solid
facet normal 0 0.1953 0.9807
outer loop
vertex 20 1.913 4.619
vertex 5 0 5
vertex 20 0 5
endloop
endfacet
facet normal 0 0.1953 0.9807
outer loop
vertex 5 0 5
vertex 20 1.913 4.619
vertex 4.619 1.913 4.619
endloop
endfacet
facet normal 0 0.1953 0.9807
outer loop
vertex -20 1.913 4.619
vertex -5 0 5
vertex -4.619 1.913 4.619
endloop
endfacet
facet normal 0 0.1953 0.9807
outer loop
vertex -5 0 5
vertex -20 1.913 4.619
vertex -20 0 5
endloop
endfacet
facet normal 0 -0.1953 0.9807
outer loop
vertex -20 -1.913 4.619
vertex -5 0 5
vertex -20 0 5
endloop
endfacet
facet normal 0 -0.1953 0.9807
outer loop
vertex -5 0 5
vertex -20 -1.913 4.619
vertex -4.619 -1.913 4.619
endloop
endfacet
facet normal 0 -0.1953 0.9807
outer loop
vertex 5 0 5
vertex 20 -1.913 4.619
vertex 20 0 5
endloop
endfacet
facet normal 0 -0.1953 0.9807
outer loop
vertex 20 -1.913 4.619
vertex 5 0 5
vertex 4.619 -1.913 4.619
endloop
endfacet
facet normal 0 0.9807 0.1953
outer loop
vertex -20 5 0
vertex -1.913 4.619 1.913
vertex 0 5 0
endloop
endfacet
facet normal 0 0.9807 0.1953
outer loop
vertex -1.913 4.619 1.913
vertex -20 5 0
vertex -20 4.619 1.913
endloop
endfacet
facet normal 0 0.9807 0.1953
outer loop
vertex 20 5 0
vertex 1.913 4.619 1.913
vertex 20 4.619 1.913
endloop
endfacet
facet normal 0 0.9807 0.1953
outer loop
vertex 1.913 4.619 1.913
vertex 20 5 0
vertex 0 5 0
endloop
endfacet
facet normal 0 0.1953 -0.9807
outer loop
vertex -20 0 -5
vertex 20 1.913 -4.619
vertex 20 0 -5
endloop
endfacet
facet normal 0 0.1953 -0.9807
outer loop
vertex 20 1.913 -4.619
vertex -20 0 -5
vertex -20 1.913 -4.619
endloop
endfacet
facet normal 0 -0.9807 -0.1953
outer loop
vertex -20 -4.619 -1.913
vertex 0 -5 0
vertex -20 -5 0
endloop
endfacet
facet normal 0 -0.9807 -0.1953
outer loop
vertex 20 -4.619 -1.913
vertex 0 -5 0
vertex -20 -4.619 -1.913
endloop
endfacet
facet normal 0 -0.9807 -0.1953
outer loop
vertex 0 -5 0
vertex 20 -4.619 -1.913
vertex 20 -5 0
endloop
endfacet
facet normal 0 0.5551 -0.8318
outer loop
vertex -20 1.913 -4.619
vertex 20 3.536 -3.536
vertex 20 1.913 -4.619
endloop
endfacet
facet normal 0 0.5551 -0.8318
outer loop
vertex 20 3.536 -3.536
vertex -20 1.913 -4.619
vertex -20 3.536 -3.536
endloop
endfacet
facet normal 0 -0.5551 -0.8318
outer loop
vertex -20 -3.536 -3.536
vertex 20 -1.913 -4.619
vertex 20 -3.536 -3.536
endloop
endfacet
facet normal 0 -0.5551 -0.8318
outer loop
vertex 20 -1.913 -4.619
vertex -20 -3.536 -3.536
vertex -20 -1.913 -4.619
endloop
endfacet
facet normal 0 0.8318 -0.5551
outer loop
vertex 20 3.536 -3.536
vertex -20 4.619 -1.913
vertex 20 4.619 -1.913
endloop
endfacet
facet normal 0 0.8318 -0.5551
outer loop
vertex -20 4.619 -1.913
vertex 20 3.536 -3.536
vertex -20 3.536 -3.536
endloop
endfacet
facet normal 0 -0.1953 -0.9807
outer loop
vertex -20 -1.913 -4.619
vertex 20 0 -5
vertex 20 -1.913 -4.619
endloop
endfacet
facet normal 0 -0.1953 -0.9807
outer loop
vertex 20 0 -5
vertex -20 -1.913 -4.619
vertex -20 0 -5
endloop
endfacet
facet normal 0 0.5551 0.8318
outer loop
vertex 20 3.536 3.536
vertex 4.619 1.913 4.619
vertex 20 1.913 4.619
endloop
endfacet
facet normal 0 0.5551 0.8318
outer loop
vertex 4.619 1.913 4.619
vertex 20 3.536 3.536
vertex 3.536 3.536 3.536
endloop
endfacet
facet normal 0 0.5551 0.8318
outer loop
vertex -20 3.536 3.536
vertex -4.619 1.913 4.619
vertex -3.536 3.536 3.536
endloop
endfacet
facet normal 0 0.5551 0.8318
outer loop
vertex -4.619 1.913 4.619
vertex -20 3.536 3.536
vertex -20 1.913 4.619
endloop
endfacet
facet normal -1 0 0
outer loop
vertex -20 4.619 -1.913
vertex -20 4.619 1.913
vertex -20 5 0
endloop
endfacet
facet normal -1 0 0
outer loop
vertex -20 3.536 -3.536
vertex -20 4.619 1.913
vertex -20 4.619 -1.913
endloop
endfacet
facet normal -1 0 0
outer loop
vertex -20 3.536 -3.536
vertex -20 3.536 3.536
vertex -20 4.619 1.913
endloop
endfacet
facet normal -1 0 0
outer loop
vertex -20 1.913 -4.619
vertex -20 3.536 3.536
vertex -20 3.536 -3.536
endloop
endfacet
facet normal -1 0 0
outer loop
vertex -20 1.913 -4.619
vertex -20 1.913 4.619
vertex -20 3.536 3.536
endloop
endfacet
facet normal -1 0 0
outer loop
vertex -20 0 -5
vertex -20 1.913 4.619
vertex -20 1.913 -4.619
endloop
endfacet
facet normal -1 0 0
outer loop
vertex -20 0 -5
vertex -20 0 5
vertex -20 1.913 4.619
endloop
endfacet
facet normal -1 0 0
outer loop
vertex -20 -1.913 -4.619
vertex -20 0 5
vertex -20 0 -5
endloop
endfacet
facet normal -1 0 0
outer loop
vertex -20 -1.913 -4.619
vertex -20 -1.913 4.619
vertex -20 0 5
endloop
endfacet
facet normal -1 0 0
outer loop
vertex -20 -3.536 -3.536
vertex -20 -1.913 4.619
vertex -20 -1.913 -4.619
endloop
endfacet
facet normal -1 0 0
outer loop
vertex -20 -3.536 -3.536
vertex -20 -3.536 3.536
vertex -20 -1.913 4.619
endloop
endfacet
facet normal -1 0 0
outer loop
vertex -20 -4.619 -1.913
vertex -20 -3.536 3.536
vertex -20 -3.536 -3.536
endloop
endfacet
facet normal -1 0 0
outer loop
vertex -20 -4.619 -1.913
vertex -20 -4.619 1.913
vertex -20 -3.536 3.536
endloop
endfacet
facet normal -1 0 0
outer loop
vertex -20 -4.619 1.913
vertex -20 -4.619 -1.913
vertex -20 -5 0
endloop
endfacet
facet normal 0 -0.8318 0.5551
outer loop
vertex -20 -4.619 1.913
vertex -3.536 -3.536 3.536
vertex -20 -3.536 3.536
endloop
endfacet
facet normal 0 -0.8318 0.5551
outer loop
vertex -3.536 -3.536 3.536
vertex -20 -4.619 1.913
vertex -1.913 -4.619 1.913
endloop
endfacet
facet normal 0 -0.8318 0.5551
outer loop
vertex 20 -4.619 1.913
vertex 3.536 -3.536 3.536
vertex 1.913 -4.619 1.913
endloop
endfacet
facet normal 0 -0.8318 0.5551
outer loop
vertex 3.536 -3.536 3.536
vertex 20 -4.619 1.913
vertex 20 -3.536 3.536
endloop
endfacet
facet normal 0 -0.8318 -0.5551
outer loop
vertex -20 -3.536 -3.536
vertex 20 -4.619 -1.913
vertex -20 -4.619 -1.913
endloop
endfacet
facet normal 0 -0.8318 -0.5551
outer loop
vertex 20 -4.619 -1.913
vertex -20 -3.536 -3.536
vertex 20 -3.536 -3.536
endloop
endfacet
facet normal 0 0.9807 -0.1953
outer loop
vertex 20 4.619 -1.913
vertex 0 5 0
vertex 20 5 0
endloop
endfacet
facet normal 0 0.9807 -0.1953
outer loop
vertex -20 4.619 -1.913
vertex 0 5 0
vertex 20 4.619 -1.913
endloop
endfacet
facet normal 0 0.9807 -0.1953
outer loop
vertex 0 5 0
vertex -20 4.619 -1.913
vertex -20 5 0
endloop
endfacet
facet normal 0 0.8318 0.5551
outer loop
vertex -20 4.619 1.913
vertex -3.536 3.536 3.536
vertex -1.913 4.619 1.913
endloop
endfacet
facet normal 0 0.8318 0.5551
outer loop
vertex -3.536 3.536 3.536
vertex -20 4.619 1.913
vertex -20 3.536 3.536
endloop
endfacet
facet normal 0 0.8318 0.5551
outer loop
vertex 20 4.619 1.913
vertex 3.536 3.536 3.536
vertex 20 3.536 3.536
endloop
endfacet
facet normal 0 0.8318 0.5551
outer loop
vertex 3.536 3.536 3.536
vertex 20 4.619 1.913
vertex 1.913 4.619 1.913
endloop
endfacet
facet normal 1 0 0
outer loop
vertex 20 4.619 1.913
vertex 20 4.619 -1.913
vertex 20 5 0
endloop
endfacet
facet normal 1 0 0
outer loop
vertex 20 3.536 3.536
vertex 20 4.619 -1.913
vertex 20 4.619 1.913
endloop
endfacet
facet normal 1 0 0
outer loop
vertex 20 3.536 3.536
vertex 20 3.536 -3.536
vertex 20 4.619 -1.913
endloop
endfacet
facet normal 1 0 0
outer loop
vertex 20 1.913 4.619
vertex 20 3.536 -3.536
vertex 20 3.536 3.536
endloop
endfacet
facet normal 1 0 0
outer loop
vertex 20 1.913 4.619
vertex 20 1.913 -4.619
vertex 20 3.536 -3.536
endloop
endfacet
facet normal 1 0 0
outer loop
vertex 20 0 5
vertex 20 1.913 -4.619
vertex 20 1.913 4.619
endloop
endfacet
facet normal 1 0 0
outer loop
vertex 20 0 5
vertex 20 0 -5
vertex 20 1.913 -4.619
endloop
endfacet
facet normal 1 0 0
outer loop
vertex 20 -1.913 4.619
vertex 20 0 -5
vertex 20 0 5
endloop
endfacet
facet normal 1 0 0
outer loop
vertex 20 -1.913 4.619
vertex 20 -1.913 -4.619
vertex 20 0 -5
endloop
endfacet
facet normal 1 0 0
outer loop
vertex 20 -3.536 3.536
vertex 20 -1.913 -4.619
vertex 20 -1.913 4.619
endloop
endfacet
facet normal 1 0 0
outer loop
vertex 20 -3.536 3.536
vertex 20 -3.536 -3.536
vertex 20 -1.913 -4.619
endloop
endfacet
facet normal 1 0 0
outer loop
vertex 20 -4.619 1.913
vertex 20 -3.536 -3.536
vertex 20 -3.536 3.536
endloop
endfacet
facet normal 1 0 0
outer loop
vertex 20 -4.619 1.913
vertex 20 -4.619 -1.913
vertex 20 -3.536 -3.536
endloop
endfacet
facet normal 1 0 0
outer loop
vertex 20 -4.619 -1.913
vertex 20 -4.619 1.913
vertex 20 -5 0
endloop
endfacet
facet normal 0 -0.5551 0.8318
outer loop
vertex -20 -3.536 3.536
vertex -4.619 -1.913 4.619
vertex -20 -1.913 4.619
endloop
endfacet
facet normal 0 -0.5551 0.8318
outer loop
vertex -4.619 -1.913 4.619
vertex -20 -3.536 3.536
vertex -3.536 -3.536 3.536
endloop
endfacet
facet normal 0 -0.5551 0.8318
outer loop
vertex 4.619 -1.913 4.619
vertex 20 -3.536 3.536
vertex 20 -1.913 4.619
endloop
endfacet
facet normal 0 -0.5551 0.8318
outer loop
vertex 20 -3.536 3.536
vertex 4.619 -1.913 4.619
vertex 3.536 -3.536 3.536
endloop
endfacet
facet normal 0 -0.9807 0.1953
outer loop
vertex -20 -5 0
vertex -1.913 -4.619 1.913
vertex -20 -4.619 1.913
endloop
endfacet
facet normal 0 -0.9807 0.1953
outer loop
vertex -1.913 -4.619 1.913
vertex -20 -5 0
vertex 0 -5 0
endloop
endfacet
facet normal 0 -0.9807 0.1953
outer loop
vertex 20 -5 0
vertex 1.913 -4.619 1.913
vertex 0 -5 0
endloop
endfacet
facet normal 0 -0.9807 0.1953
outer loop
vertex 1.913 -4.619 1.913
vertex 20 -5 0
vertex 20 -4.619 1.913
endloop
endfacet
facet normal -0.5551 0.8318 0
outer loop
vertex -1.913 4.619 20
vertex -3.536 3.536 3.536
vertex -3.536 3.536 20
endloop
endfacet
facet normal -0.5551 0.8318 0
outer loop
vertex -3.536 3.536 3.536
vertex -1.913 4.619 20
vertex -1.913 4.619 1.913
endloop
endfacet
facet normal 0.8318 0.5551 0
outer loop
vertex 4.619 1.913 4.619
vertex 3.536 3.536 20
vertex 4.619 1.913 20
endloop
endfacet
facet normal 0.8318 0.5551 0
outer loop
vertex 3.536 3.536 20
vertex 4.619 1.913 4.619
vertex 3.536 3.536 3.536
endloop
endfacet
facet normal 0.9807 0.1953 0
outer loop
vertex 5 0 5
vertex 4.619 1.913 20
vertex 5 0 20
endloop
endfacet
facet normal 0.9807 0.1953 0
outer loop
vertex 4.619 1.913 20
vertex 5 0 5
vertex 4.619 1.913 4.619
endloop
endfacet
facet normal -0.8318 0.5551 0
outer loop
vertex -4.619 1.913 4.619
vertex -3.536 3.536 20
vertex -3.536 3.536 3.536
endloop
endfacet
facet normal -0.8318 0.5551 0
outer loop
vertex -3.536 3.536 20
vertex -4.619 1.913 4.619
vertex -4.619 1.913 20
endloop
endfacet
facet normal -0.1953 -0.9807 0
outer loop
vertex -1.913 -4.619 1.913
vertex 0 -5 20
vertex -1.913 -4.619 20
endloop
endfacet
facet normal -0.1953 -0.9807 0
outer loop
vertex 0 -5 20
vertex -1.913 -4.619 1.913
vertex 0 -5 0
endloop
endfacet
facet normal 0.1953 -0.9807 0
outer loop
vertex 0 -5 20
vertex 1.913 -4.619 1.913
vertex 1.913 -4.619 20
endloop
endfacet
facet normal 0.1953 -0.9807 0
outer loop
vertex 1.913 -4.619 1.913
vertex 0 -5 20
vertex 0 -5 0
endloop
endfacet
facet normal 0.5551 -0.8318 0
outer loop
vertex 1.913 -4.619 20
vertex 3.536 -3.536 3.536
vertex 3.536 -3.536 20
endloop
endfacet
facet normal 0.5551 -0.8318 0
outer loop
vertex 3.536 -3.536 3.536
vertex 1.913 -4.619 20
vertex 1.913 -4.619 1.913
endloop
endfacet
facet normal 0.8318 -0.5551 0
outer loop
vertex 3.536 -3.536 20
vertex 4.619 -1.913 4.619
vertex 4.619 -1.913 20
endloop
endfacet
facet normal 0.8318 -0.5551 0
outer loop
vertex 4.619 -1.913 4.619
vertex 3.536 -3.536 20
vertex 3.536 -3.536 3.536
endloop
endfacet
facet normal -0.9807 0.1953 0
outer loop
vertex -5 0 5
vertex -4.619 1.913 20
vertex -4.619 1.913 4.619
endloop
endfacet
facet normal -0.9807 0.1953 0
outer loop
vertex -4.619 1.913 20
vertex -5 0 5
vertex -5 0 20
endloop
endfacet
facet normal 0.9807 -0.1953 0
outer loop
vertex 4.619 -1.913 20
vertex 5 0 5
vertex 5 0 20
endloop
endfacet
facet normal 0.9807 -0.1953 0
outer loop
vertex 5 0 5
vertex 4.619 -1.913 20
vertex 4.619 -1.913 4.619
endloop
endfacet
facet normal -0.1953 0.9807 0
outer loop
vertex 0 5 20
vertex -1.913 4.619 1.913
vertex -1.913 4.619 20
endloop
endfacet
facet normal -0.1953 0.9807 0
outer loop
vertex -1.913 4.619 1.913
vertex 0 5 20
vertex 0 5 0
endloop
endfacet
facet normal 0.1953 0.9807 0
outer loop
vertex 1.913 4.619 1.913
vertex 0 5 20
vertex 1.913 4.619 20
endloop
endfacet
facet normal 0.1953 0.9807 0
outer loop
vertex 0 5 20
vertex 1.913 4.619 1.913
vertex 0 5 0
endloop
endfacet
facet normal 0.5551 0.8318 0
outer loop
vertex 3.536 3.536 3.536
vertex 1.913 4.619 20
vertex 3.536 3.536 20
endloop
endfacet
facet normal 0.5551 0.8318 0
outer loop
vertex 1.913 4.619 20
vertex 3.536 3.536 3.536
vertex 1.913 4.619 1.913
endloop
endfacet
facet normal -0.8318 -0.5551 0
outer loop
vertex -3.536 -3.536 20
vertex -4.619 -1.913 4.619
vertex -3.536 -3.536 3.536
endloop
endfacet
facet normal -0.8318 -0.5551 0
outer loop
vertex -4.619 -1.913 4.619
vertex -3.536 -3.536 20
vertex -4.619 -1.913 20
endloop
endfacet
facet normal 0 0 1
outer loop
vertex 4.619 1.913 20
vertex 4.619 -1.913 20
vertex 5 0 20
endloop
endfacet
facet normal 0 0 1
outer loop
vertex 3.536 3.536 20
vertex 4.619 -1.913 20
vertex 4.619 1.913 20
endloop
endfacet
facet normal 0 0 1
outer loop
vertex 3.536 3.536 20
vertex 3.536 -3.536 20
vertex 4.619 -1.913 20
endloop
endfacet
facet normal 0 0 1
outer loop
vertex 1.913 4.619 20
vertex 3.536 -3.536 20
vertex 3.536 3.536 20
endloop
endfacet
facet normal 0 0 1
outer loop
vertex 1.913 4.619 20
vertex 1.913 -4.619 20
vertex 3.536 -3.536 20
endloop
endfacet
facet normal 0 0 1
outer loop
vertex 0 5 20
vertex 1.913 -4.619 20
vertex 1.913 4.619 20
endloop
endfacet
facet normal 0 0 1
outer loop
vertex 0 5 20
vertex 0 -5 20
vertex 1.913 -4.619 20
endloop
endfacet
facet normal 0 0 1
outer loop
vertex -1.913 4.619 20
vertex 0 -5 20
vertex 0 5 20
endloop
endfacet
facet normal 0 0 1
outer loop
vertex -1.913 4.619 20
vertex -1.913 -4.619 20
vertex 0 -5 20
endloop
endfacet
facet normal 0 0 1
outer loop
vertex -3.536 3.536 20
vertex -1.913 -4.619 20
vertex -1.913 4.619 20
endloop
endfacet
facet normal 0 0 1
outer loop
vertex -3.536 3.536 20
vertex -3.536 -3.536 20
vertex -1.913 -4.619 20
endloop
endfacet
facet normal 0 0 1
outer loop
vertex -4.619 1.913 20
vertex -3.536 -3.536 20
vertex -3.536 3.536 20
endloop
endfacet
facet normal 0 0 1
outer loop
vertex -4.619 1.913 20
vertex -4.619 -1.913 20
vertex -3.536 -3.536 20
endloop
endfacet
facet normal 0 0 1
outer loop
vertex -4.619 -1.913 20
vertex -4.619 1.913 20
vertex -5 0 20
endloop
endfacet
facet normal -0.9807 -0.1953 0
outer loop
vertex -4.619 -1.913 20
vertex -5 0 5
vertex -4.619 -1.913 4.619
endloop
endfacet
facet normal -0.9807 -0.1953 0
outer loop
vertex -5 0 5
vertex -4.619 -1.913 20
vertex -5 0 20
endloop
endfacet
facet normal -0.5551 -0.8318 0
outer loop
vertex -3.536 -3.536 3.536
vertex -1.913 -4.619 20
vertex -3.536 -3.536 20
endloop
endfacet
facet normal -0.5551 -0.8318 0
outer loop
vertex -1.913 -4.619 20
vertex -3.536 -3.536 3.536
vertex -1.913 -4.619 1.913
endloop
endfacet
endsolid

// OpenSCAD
// The exact-geometry audit's case c14 (docs/audits/exact-geometry-rust.md).
// volume: 4379.055636634691
union() { rotate([0,90,0]) cylinder(r=5, h=40, center=true); cylinder(r=5, h=20); }
